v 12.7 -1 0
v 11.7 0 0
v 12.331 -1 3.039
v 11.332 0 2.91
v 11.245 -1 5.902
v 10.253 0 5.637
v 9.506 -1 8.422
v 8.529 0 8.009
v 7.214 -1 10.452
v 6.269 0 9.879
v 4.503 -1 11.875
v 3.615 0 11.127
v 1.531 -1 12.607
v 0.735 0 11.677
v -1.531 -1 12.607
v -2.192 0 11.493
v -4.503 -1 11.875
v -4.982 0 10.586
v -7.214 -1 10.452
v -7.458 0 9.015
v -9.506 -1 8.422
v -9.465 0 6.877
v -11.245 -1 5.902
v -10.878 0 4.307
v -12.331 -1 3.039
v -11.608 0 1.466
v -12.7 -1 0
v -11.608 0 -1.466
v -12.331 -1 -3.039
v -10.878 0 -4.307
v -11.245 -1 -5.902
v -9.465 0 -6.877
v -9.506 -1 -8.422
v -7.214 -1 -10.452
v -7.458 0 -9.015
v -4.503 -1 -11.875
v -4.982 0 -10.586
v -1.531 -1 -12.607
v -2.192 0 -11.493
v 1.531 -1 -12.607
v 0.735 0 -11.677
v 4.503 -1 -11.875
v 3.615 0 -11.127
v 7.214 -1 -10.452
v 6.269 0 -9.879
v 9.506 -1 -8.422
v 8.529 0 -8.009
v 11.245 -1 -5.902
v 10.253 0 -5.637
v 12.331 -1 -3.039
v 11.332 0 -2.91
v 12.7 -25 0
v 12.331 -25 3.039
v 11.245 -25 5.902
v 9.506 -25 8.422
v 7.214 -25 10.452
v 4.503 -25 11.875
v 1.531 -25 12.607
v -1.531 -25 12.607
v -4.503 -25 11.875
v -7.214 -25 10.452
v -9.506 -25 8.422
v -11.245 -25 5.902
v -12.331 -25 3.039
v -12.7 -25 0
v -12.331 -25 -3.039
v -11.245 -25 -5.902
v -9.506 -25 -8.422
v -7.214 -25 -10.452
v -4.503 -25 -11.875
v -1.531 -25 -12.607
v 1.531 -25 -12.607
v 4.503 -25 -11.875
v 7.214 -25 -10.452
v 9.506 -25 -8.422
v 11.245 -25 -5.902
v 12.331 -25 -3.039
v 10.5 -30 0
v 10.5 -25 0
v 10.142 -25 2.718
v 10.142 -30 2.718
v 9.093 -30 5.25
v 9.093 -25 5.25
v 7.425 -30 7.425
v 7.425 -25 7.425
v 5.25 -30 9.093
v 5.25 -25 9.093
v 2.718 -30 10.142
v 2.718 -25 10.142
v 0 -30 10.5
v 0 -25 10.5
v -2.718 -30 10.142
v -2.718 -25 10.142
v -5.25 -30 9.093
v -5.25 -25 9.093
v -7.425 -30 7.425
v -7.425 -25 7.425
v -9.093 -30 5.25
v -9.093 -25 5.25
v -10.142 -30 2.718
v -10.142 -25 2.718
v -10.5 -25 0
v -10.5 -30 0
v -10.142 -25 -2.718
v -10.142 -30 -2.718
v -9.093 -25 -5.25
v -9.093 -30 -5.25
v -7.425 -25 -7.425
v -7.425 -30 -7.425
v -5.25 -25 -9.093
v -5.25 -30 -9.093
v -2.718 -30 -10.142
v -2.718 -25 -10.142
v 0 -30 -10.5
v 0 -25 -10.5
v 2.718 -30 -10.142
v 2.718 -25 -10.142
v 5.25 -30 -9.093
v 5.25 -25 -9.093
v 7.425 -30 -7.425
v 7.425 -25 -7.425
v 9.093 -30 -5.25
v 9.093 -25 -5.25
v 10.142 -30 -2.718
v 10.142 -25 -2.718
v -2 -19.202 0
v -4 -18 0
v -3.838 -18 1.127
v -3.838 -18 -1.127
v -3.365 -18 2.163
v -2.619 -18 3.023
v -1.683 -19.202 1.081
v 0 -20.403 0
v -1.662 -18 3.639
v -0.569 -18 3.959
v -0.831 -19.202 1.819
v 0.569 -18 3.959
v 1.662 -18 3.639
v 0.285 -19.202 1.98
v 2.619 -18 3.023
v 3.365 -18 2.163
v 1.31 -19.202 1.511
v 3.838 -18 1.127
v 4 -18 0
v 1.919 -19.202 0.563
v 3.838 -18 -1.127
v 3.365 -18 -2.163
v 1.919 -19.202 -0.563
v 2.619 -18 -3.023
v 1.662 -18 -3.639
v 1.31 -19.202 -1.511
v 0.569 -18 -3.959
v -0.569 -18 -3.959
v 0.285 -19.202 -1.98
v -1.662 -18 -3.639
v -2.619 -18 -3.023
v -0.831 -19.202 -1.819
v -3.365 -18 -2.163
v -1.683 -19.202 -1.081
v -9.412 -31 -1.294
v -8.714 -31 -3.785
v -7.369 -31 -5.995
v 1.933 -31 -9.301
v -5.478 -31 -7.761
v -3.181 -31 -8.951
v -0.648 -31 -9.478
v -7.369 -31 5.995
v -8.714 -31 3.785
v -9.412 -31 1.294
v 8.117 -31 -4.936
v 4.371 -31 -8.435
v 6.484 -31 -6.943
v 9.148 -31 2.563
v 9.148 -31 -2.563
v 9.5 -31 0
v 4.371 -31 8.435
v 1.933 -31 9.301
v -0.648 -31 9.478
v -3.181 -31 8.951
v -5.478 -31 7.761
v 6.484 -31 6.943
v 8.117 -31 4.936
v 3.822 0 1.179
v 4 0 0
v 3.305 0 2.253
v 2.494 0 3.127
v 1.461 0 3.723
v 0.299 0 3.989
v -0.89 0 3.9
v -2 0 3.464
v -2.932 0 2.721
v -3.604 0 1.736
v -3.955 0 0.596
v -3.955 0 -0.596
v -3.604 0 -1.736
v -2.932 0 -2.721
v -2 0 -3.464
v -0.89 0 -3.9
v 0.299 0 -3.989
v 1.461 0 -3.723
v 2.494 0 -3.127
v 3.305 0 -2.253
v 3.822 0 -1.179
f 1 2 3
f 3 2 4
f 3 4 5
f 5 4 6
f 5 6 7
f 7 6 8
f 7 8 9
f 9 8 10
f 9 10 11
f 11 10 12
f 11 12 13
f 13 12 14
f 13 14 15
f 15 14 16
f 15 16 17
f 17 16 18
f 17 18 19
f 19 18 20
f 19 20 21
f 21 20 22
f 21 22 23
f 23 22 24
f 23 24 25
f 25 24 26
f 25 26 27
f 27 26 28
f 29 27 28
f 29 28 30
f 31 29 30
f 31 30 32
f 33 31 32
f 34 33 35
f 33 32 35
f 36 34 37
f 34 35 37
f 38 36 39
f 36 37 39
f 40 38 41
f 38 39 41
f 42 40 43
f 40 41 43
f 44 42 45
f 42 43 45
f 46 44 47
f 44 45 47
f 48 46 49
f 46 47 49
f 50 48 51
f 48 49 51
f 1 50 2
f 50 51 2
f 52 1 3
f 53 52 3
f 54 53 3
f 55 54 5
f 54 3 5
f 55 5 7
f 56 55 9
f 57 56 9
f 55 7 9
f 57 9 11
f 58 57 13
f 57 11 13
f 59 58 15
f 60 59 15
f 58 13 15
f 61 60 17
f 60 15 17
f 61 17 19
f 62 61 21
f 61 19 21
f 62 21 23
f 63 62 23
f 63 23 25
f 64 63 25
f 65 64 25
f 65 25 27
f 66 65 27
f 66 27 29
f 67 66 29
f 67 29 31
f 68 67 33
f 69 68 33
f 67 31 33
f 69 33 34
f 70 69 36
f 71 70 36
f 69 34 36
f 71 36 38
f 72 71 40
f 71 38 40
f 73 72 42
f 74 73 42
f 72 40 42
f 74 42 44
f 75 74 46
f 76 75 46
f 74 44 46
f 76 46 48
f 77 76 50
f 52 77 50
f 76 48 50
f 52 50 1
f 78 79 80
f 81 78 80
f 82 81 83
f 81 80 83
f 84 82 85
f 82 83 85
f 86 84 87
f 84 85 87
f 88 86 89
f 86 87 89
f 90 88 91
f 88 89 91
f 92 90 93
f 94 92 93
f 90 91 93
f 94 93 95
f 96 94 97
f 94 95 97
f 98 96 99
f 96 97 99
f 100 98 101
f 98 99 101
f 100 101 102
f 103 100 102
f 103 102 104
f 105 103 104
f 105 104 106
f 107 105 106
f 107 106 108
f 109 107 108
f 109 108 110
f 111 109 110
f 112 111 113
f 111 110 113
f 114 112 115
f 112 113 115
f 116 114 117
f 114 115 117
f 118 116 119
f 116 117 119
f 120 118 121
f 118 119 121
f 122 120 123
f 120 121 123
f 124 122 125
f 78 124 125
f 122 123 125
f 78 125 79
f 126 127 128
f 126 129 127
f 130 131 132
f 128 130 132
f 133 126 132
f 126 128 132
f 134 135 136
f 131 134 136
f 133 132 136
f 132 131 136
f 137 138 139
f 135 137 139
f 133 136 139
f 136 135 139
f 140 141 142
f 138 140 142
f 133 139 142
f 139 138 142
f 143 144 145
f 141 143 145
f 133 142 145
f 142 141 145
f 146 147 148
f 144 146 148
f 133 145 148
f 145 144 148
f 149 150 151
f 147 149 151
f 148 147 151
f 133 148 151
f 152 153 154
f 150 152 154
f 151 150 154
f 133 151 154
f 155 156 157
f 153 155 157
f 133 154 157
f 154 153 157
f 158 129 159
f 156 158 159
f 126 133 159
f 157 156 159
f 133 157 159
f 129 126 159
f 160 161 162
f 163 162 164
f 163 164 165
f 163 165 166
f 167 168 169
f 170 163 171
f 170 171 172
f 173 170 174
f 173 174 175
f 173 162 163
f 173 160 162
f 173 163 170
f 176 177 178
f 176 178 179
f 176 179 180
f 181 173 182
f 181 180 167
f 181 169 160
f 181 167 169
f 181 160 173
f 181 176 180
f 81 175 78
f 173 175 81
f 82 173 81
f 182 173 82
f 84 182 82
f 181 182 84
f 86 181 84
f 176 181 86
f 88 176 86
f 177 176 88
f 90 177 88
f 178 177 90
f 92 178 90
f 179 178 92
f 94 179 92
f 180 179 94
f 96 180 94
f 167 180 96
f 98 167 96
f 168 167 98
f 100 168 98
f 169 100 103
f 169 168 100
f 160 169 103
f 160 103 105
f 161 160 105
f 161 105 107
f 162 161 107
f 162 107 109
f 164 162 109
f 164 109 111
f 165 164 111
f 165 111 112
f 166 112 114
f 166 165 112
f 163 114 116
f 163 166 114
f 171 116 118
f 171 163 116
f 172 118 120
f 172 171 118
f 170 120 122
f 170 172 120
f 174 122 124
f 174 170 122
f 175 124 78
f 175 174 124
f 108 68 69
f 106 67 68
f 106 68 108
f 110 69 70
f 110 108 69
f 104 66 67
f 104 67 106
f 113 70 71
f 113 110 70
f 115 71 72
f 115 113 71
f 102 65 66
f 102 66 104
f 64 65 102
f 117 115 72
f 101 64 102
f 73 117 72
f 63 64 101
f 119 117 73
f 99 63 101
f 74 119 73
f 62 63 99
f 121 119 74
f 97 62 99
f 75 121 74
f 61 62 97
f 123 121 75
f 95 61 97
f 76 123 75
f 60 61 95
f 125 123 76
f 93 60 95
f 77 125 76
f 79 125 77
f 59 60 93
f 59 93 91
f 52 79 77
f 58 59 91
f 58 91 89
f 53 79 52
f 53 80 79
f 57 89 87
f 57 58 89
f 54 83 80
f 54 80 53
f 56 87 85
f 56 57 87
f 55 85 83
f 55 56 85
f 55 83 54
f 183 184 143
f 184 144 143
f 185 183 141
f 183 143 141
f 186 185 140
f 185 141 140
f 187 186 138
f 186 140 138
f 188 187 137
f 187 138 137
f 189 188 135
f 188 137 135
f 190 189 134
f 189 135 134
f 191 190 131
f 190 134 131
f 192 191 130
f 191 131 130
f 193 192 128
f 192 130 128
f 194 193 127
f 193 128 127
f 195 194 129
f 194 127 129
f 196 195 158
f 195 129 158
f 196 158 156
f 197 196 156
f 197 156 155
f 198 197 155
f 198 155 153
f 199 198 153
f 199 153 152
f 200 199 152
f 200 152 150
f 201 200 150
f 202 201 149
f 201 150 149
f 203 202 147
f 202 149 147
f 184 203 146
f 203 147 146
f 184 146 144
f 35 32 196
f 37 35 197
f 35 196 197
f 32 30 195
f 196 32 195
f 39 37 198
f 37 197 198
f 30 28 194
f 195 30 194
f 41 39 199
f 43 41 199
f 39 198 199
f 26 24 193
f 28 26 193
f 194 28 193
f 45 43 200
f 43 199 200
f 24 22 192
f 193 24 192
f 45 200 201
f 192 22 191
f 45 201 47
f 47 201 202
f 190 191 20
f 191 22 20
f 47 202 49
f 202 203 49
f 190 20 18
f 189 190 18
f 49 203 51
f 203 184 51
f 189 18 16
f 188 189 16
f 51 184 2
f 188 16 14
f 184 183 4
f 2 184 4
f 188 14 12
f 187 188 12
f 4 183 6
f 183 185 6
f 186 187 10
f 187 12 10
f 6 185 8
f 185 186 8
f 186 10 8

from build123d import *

# Parameters (mm, degrees)
F0_R     = 12.7
F1_DEPTH = 25
F2_R     = 10.5
F3_DEPTH = 6
F4_SIZE  = 1
F6_D     = 8
F6_DEPTH = 18
F6_TIP   = 2.4034424761


with BuildPart() as f1:
    # F0 (on Front) → F1 (new body)
    with BuildSketch(Plane.XZ):
        Circle(F0_R)
    extrude(amount=F1_DEPTH)

    # F2 (on face) → F3 (join)
    with BuildSketch(Plane.XZ.offset(25)):
        Circle(F2_R)
    extrude(amount=F3_DEPTH)

    # F4
    f4_edges = [f1.edges().sort_by_distance(p)[0] for p in [
        (-10.5, -31, 0),
        (-12.7, 0, 0),
    ]]
    chamfer(f4_edges, length=F4_SIZE)

    # F6
    with Locations(Plane(origin=(0, 0, 0), x_dir=(-1, 0, 0), z_dir=(0, 1, 0))):
        with Locations((0, 0)):
            Hole(F6_D / 2, depth=F6_DEPTH)
            with Locations((0, 0, -(F6_DEPTH + F6_TIP / 2))):  # 118° drill point
                Cone(0, F6_D / 2, F6_TIP, mode=Mode.SUBTRACT)


solid = f1.part
